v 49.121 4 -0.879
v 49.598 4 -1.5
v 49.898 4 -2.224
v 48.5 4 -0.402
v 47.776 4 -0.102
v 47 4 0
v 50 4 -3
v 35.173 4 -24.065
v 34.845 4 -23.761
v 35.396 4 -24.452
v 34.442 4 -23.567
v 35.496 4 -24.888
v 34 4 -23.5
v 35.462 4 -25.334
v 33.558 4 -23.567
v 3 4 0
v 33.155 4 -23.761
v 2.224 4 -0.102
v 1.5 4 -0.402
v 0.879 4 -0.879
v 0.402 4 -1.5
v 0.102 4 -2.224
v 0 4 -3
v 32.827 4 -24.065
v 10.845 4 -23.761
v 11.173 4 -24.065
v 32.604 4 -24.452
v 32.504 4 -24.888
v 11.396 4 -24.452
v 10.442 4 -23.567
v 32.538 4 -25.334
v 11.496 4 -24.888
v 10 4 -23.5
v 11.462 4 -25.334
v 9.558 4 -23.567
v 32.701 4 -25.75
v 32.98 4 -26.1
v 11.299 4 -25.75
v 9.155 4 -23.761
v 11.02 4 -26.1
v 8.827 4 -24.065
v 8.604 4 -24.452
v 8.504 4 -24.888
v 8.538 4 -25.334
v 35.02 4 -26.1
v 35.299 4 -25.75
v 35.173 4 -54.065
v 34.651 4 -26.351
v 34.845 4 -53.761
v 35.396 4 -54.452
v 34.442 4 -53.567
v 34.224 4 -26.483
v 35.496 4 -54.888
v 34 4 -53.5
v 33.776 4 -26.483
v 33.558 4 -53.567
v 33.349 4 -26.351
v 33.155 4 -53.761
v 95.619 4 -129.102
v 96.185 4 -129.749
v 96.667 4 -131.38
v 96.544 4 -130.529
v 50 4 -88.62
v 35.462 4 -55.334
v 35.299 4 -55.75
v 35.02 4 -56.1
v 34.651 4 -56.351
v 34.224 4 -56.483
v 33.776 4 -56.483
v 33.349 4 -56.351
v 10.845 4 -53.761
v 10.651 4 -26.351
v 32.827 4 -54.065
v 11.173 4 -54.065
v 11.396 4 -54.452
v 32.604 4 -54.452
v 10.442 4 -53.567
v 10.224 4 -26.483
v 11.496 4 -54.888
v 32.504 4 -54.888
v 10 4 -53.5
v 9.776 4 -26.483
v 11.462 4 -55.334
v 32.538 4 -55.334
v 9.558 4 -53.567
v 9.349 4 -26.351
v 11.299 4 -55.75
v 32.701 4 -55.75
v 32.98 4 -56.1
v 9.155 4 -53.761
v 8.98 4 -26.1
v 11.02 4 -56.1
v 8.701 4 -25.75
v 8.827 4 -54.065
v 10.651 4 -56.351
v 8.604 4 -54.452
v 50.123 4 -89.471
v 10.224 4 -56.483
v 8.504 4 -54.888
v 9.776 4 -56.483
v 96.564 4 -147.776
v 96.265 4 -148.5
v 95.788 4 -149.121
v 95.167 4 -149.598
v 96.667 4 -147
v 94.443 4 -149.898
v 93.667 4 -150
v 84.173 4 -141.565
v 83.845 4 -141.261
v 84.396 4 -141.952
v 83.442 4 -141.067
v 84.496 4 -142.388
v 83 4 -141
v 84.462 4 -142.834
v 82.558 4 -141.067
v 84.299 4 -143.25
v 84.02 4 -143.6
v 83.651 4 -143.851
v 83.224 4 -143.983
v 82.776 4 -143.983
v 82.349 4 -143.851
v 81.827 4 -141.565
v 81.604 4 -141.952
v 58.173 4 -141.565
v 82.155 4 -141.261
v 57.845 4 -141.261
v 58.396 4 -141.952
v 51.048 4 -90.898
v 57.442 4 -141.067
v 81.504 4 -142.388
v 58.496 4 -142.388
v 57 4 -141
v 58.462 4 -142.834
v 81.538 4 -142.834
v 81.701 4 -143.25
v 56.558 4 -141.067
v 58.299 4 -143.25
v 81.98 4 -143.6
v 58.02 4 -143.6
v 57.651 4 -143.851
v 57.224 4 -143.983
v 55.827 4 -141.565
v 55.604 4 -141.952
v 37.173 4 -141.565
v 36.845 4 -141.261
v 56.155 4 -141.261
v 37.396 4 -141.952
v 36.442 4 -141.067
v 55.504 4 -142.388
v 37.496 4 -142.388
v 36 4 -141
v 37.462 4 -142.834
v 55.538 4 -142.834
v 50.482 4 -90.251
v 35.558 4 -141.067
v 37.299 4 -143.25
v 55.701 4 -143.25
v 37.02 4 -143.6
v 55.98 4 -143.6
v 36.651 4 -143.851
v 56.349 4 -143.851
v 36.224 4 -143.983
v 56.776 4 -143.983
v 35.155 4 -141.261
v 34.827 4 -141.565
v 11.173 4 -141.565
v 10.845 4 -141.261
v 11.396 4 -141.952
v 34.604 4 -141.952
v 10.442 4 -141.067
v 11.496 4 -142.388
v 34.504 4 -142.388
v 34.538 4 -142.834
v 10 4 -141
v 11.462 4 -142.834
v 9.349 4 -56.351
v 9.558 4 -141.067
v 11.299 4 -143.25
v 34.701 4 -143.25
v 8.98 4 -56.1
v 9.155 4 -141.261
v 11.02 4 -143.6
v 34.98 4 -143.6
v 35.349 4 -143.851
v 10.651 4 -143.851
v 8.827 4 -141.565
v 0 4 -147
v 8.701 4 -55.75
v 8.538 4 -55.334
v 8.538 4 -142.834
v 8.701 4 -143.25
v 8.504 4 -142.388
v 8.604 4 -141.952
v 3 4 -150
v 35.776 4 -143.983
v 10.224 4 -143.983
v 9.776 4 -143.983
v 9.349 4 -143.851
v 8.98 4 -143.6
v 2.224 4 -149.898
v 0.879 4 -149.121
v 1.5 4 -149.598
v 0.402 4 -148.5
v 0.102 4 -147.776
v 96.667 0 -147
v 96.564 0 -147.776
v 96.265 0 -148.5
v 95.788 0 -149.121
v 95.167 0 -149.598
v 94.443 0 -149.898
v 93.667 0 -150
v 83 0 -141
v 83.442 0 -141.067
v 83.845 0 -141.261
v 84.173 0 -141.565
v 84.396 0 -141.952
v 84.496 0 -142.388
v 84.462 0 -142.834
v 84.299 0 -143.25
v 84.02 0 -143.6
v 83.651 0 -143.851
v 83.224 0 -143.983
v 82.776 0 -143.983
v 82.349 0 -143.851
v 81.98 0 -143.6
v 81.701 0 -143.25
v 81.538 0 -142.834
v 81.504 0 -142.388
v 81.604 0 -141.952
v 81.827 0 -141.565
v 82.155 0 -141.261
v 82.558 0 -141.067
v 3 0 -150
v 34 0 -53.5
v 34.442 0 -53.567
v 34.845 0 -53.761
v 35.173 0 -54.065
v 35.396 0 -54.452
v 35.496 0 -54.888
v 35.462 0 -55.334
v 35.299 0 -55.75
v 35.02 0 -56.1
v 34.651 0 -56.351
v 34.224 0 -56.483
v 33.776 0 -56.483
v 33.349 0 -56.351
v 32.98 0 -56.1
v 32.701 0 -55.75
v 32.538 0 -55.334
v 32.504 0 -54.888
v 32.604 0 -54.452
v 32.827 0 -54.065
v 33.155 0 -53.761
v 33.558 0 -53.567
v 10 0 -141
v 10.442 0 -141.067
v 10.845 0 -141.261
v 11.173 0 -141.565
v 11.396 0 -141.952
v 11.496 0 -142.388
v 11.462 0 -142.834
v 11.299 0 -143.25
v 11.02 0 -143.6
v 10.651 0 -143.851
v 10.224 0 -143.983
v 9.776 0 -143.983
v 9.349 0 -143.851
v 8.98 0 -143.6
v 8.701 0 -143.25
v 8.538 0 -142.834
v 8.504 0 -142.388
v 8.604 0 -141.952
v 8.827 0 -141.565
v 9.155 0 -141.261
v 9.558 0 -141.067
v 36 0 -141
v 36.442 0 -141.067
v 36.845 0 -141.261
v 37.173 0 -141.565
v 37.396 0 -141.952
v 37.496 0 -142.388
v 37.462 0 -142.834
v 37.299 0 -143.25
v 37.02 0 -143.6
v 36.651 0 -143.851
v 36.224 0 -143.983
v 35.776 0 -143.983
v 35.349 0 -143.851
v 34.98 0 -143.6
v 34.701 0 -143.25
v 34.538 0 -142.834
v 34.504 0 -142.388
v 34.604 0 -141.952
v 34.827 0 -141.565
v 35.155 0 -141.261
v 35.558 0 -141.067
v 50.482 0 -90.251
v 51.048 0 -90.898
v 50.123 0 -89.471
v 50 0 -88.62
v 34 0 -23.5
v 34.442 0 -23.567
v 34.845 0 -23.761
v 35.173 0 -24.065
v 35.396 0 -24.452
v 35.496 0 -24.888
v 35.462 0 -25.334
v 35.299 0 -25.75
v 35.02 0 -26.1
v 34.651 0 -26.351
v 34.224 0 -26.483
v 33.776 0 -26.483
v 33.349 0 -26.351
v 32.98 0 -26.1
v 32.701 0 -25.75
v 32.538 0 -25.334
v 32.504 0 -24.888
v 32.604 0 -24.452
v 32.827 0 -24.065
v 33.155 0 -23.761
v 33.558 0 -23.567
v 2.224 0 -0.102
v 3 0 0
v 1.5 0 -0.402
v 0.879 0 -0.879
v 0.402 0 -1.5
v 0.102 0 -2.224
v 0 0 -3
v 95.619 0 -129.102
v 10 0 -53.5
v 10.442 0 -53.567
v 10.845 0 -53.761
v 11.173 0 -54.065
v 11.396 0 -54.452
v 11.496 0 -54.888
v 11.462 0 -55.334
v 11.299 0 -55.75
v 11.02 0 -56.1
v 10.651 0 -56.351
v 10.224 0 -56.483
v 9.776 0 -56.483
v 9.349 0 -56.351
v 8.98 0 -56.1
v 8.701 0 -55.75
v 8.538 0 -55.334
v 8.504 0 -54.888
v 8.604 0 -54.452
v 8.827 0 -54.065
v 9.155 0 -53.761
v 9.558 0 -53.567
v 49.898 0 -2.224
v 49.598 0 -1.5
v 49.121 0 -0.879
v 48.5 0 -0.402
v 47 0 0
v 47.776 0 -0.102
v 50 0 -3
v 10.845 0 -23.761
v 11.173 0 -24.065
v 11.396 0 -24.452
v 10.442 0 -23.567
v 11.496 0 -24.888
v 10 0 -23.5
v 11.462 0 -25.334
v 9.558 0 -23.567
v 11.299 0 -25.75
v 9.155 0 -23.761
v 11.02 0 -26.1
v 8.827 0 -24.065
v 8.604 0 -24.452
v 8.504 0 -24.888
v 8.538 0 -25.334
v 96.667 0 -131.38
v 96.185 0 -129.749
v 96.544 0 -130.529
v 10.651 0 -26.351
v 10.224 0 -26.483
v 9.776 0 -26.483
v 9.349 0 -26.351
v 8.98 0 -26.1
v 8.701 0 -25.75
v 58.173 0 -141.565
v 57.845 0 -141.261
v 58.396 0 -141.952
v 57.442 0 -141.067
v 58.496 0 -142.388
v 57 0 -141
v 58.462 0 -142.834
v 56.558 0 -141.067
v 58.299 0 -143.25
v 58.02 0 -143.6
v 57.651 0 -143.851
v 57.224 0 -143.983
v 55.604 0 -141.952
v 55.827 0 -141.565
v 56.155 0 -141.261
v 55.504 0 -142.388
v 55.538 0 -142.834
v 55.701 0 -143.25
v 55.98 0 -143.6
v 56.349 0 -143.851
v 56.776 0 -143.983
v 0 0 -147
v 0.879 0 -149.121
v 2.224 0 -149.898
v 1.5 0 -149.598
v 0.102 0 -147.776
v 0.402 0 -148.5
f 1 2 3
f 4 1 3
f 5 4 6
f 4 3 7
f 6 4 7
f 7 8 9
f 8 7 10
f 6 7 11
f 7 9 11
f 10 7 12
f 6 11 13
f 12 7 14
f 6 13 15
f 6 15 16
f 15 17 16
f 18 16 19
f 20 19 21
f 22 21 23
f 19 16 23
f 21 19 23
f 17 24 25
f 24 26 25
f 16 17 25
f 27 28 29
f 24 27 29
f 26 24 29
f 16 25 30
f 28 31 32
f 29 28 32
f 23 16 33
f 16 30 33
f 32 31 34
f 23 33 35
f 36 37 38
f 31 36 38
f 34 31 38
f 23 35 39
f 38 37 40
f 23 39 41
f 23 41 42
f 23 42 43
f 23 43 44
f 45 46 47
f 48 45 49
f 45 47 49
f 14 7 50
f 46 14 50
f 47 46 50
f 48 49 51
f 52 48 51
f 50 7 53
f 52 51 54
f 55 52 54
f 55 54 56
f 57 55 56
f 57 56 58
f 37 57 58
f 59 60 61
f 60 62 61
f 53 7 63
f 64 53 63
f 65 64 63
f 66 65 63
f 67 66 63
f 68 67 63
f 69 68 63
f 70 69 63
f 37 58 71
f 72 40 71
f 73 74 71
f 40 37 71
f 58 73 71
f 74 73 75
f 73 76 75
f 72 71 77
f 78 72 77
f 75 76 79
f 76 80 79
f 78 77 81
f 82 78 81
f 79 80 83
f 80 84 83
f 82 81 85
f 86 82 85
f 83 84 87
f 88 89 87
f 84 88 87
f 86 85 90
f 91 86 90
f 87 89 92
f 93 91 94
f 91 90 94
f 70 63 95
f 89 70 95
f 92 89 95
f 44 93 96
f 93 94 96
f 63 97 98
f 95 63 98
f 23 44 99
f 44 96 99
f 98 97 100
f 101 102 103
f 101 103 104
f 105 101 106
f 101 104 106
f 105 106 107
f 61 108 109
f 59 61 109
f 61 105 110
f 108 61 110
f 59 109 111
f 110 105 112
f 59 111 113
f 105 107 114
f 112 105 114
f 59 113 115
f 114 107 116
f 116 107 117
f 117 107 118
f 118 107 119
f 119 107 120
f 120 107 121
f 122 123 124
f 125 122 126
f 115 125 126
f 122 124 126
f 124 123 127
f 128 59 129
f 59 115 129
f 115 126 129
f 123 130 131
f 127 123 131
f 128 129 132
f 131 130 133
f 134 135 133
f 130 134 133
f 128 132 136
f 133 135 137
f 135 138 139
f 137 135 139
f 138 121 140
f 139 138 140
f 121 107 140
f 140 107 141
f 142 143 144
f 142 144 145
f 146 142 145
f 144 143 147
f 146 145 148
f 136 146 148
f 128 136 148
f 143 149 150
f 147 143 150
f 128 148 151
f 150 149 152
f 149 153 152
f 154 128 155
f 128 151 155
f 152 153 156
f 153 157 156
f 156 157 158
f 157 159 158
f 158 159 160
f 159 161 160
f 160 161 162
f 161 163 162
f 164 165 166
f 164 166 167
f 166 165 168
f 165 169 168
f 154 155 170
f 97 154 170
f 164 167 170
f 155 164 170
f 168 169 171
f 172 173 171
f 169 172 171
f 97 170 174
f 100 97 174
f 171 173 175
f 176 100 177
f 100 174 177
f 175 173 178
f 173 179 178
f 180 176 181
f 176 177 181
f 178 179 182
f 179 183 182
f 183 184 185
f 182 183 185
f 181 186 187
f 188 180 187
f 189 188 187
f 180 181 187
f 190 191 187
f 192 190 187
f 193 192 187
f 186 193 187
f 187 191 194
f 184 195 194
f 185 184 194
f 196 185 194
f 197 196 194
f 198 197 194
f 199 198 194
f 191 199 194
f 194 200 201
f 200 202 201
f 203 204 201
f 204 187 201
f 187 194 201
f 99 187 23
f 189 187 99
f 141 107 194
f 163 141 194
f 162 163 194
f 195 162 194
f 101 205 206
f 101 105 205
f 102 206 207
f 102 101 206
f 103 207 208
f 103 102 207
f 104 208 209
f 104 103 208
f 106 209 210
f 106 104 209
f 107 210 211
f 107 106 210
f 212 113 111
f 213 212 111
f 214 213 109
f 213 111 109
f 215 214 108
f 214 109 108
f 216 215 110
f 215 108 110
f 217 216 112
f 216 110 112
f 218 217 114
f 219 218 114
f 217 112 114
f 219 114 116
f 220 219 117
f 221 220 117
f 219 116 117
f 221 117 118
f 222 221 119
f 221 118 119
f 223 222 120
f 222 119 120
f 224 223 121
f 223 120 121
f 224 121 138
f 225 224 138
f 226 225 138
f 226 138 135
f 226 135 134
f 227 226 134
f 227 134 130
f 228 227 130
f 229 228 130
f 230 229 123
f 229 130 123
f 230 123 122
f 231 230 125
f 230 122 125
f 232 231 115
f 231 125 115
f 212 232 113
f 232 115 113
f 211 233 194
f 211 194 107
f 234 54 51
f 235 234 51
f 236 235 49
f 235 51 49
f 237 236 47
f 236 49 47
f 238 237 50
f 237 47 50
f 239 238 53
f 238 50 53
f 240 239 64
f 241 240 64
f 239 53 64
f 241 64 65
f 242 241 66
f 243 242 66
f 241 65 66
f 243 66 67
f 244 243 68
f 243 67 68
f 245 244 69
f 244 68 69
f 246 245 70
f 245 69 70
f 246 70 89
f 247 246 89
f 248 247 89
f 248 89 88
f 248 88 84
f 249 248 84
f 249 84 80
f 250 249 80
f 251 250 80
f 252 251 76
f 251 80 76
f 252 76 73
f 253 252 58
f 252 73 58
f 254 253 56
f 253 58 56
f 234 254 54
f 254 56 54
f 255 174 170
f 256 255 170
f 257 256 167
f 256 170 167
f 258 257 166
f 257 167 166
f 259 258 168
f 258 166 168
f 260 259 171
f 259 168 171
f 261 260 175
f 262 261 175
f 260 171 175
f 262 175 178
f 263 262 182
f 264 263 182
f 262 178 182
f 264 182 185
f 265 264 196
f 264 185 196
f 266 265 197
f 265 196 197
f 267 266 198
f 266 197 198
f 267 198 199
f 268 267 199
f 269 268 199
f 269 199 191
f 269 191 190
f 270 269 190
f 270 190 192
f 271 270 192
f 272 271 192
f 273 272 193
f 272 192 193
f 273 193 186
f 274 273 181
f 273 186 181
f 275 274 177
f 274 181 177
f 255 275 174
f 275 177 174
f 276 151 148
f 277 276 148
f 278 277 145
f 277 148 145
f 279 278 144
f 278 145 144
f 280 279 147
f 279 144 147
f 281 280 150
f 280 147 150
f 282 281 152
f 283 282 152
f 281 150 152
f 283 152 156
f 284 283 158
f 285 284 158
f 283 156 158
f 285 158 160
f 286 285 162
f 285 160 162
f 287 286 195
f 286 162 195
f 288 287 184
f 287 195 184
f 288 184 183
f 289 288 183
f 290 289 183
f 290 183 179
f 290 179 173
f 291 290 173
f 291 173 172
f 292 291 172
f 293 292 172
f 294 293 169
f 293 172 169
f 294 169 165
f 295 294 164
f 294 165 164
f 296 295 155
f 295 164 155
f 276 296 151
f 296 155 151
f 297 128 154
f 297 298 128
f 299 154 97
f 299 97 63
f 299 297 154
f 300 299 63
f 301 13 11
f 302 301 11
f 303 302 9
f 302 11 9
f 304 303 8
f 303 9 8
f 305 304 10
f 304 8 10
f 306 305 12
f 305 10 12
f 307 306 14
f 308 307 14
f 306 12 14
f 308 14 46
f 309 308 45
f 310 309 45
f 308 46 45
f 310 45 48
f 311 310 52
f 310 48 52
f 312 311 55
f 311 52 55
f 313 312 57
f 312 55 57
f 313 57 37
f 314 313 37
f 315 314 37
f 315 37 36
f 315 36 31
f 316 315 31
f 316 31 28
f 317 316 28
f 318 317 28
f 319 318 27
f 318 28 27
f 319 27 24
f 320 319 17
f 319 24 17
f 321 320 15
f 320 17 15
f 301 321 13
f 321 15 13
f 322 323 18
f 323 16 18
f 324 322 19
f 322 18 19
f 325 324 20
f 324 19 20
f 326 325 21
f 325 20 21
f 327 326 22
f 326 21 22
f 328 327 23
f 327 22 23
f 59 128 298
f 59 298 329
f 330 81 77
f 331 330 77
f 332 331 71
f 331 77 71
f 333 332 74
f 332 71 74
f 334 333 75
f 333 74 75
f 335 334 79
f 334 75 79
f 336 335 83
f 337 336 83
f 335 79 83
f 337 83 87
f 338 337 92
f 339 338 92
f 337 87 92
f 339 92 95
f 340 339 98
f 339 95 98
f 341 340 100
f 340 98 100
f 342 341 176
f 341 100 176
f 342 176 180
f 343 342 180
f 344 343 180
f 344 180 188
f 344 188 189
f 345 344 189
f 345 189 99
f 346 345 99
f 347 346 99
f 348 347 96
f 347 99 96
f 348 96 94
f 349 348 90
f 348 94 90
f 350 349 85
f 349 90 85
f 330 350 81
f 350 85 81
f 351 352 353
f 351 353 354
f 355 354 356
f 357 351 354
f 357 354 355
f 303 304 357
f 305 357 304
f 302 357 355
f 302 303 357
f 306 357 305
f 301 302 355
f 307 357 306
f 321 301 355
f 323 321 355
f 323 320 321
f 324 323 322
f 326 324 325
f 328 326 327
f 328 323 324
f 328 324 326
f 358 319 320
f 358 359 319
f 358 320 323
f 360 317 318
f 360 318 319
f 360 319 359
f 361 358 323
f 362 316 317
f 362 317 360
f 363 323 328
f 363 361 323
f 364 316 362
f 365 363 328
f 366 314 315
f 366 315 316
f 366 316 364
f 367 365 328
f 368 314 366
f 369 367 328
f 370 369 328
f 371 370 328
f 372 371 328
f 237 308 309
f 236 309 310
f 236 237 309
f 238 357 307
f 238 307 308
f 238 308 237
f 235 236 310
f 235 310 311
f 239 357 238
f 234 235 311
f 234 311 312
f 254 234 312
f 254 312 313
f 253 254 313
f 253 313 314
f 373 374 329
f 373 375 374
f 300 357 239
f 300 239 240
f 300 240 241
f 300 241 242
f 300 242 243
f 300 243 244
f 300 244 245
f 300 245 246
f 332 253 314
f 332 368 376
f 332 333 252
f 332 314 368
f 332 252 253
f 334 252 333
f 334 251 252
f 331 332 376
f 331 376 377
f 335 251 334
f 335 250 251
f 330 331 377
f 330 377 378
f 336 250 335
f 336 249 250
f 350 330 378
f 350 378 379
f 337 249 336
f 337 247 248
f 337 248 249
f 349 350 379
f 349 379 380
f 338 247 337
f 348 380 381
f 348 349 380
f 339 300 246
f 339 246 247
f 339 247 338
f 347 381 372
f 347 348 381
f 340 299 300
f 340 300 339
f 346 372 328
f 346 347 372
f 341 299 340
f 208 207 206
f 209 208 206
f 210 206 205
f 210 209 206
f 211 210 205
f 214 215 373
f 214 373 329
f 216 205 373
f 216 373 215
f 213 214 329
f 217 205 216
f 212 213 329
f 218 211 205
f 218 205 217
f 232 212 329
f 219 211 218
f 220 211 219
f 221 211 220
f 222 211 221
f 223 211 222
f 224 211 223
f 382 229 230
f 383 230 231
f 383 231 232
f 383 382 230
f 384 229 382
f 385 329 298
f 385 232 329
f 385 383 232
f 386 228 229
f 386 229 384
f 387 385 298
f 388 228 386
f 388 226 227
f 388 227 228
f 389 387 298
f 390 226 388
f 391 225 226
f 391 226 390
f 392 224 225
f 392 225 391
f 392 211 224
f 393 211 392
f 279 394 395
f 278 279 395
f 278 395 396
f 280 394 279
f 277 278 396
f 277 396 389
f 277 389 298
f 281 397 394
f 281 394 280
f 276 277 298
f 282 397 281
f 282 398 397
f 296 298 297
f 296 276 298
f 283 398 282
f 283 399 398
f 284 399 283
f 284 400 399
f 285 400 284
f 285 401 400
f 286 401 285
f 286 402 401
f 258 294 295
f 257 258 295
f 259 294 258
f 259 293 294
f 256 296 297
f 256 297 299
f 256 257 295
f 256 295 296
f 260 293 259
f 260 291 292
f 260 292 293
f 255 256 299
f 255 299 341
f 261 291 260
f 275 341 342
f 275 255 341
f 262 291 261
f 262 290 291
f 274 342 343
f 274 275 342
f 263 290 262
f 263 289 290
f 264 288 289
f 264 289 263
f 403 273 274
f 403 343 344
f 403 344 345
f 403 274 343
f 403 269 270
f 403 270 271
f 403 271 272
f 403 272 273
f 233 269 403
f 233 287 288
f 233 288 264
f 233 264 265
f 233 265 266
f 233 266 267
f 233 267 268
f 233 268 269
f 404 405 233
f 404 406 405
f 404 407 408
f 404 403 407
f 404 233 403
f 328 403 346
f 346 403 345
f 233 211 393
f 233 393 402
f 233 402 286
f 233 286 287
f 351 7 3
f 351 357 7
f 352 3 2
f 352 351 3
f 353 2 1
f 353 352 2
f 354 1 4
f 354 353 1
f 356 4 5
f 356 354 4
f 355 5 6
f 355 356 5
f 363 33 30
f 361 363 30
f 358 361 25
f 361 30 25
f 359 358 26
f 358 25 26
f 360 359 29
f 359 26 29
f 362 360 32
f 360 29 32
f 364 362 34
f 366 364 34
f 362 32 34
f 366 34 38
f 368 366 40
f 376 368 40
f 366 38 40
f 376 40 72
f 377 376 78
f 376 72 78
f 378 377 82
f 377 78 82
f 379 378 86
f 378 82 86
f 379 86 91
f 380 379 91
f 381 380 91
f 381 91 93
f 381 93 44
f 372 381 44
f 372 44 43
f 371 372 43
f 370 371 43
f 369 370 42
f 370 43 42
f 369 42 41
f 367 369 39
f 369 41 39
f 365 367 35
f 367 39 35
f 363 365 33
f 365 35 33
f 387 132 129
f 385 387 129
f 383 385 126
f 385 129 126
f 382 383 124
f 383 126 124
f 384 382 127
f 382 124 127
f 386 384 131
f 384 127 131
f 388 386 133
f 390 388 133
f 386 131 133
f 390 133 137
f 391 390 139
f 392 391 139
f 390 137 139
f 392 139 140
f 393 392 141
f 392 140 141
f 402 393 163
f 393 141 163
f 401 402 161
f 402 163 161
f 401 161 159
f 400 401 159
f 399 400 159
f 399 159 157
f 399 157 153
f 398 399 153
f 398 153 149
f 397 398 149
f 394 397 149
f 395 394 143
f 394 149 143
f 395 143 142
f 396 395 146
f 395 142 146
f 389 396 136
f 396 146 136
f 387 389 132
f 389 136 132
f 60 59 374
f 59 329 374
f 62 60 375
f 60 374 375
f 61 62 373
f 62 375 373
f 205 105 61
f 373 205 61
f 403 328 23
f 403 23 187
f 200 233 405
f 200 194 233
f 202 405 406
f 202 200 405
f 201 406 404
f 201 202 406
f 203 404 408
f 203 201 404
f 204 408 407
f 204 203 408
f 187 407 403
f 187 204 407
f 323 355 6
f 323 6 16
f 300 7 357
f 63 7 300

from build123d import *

# Parameters (mm, degrees)
EXTRUDE_1_DEPTH     = 4
SKETCH_2_R          = 1.5
CUT_EXTRUDE_1_DEPTH = 4
SKETCH_3_R          = 1.5
CUT_EXTRUDE_2_DEPTH = 4
CUT_EXTRUDE_3_DEPTH = 10
CUT_EXTRUDE_5_DEPTH = 10
CUT_EXTRUDE_6_DEPTH = 10
FILLET_1_R          = 3


with BuildPart() as part:
    # 草图1 → 凸台-拉伸1 (new body)
    with BuildSketch(Plane(origin=(0, 0, 0), x_dir=(1, 0, 0), z_dir=(0, 1, 0))):
        Polygon((100, 150), (75, 0), (0, 0), (0, 150), align=None)
    extrude(amount=EXTRUDE_1_DEPTH)

    # 草图2 → 切除-拉伸1 (cut)
    with BuildSketch(Plane(origin=(0, 4, 0), x_dir=(1, 0, 0), z_dir=(0, 1, 0))):
        with Locations(Location((10, 25, 0), (0, 0, 270))):
            Circle(SKETCH_2_R)
        with Locations(Location((34, 55, 0), (0, 0, 270))):
            Circle(SKETCH_2_R)
        with Locations(Location((34, 25, 0), (0, 0, 270))):
            Circle(SKETCH_2_R)
        with Locations(Location((10, 55, 0), (0, 0, 270))):
            Circle(SKETCH_2_R)
    extrude(amount=-CUT_EXTRUDE_1_DEPTH, mode=Mode.SUBTRACT)

    # 草图3 → 切除-拉伸2 (cut)
    with BuildSketch(Plane(origin=(0, 4, 0), x_dir=(1, 0, 0), z_dir=(0, 1, 0))):
        with Locations(Location((10, 142.5, 0), (0, 0, 270))):
            Circle(SKETCH_3_R)
        with Locations(Location((36, 142.5, 0), (0, 0, 270))):
            Circle(SKETCH_3_R)
        with Locations(Location((57, 142.5, 0), (0, 0, 270))):
            Circle(SKETCH_3_R)
        with Locations(Location((83, 142.5, 0), (0, 0, 270))):
            Circle(SKETCH_3_R)
    extrude(amount=-CUT_EXTRUDE_2_DEPTH, mode=Mode.SUBTRACT)

    # 草图4 → 切除-拉伸3 (cut)
    with BuildSketch(Plane(origin=(0, 4, 0), x_dir=(1, 0, 0), z_dir=(0, 1, 0))):
        Polygon((121.630506201, 0), (50, 0), (50, 90), (150.537772798, 90), align=None)
    extrude(amount=-CUT_EXTRUDE_3_DEPTH, mode=Mode.SUBTRACT)

    # 草图5 → 切除-拉伸5 (cut)
    with BuildSketch(Plane(origin=(0, 4, 0), x_dir=(1, 0, 0), z_dir=(0, 1, 0))):
        Polygon((150.2124031, 125.352298199), (66.770540327, 64.546264366), (50, 90), (96.666666667, 130), align=None)
    extrude(amount=-CUT_EXTRUDE_5_DEPTH, mode=Mode.SUBTRACT)

    # 草图6 → 切除-拉伸6 (cut)
    with BuildSketch(Plane(origin=(0, 4, 0), x_dir=(1, 0, 0), z_dir=(0, 1, 0))):
        Polygon((96.666666667, 130), (140.554271479, 130), (107.506476867, 160.861157787), (96.666666667, 160.861157787), align=None)
    extrude(amount=-CUT_EXTRUDE_6_DEPTH, mode=Mode.SUBTRACT)

    # 圆角1
    fillet_1_edges = [part.edges().sort_by_distance(p)[0] for p in [
        (50, 2, -90),
        (50, 2, 0),
        (96.666666667, 2, -130),
        (0, 2, -150),
        (0, 2, 0),
        (96.666666667, 2, -150),
    ]]
    fillet(fillet_1_edges, radius=FILLET_1_R)


solid = part.part
